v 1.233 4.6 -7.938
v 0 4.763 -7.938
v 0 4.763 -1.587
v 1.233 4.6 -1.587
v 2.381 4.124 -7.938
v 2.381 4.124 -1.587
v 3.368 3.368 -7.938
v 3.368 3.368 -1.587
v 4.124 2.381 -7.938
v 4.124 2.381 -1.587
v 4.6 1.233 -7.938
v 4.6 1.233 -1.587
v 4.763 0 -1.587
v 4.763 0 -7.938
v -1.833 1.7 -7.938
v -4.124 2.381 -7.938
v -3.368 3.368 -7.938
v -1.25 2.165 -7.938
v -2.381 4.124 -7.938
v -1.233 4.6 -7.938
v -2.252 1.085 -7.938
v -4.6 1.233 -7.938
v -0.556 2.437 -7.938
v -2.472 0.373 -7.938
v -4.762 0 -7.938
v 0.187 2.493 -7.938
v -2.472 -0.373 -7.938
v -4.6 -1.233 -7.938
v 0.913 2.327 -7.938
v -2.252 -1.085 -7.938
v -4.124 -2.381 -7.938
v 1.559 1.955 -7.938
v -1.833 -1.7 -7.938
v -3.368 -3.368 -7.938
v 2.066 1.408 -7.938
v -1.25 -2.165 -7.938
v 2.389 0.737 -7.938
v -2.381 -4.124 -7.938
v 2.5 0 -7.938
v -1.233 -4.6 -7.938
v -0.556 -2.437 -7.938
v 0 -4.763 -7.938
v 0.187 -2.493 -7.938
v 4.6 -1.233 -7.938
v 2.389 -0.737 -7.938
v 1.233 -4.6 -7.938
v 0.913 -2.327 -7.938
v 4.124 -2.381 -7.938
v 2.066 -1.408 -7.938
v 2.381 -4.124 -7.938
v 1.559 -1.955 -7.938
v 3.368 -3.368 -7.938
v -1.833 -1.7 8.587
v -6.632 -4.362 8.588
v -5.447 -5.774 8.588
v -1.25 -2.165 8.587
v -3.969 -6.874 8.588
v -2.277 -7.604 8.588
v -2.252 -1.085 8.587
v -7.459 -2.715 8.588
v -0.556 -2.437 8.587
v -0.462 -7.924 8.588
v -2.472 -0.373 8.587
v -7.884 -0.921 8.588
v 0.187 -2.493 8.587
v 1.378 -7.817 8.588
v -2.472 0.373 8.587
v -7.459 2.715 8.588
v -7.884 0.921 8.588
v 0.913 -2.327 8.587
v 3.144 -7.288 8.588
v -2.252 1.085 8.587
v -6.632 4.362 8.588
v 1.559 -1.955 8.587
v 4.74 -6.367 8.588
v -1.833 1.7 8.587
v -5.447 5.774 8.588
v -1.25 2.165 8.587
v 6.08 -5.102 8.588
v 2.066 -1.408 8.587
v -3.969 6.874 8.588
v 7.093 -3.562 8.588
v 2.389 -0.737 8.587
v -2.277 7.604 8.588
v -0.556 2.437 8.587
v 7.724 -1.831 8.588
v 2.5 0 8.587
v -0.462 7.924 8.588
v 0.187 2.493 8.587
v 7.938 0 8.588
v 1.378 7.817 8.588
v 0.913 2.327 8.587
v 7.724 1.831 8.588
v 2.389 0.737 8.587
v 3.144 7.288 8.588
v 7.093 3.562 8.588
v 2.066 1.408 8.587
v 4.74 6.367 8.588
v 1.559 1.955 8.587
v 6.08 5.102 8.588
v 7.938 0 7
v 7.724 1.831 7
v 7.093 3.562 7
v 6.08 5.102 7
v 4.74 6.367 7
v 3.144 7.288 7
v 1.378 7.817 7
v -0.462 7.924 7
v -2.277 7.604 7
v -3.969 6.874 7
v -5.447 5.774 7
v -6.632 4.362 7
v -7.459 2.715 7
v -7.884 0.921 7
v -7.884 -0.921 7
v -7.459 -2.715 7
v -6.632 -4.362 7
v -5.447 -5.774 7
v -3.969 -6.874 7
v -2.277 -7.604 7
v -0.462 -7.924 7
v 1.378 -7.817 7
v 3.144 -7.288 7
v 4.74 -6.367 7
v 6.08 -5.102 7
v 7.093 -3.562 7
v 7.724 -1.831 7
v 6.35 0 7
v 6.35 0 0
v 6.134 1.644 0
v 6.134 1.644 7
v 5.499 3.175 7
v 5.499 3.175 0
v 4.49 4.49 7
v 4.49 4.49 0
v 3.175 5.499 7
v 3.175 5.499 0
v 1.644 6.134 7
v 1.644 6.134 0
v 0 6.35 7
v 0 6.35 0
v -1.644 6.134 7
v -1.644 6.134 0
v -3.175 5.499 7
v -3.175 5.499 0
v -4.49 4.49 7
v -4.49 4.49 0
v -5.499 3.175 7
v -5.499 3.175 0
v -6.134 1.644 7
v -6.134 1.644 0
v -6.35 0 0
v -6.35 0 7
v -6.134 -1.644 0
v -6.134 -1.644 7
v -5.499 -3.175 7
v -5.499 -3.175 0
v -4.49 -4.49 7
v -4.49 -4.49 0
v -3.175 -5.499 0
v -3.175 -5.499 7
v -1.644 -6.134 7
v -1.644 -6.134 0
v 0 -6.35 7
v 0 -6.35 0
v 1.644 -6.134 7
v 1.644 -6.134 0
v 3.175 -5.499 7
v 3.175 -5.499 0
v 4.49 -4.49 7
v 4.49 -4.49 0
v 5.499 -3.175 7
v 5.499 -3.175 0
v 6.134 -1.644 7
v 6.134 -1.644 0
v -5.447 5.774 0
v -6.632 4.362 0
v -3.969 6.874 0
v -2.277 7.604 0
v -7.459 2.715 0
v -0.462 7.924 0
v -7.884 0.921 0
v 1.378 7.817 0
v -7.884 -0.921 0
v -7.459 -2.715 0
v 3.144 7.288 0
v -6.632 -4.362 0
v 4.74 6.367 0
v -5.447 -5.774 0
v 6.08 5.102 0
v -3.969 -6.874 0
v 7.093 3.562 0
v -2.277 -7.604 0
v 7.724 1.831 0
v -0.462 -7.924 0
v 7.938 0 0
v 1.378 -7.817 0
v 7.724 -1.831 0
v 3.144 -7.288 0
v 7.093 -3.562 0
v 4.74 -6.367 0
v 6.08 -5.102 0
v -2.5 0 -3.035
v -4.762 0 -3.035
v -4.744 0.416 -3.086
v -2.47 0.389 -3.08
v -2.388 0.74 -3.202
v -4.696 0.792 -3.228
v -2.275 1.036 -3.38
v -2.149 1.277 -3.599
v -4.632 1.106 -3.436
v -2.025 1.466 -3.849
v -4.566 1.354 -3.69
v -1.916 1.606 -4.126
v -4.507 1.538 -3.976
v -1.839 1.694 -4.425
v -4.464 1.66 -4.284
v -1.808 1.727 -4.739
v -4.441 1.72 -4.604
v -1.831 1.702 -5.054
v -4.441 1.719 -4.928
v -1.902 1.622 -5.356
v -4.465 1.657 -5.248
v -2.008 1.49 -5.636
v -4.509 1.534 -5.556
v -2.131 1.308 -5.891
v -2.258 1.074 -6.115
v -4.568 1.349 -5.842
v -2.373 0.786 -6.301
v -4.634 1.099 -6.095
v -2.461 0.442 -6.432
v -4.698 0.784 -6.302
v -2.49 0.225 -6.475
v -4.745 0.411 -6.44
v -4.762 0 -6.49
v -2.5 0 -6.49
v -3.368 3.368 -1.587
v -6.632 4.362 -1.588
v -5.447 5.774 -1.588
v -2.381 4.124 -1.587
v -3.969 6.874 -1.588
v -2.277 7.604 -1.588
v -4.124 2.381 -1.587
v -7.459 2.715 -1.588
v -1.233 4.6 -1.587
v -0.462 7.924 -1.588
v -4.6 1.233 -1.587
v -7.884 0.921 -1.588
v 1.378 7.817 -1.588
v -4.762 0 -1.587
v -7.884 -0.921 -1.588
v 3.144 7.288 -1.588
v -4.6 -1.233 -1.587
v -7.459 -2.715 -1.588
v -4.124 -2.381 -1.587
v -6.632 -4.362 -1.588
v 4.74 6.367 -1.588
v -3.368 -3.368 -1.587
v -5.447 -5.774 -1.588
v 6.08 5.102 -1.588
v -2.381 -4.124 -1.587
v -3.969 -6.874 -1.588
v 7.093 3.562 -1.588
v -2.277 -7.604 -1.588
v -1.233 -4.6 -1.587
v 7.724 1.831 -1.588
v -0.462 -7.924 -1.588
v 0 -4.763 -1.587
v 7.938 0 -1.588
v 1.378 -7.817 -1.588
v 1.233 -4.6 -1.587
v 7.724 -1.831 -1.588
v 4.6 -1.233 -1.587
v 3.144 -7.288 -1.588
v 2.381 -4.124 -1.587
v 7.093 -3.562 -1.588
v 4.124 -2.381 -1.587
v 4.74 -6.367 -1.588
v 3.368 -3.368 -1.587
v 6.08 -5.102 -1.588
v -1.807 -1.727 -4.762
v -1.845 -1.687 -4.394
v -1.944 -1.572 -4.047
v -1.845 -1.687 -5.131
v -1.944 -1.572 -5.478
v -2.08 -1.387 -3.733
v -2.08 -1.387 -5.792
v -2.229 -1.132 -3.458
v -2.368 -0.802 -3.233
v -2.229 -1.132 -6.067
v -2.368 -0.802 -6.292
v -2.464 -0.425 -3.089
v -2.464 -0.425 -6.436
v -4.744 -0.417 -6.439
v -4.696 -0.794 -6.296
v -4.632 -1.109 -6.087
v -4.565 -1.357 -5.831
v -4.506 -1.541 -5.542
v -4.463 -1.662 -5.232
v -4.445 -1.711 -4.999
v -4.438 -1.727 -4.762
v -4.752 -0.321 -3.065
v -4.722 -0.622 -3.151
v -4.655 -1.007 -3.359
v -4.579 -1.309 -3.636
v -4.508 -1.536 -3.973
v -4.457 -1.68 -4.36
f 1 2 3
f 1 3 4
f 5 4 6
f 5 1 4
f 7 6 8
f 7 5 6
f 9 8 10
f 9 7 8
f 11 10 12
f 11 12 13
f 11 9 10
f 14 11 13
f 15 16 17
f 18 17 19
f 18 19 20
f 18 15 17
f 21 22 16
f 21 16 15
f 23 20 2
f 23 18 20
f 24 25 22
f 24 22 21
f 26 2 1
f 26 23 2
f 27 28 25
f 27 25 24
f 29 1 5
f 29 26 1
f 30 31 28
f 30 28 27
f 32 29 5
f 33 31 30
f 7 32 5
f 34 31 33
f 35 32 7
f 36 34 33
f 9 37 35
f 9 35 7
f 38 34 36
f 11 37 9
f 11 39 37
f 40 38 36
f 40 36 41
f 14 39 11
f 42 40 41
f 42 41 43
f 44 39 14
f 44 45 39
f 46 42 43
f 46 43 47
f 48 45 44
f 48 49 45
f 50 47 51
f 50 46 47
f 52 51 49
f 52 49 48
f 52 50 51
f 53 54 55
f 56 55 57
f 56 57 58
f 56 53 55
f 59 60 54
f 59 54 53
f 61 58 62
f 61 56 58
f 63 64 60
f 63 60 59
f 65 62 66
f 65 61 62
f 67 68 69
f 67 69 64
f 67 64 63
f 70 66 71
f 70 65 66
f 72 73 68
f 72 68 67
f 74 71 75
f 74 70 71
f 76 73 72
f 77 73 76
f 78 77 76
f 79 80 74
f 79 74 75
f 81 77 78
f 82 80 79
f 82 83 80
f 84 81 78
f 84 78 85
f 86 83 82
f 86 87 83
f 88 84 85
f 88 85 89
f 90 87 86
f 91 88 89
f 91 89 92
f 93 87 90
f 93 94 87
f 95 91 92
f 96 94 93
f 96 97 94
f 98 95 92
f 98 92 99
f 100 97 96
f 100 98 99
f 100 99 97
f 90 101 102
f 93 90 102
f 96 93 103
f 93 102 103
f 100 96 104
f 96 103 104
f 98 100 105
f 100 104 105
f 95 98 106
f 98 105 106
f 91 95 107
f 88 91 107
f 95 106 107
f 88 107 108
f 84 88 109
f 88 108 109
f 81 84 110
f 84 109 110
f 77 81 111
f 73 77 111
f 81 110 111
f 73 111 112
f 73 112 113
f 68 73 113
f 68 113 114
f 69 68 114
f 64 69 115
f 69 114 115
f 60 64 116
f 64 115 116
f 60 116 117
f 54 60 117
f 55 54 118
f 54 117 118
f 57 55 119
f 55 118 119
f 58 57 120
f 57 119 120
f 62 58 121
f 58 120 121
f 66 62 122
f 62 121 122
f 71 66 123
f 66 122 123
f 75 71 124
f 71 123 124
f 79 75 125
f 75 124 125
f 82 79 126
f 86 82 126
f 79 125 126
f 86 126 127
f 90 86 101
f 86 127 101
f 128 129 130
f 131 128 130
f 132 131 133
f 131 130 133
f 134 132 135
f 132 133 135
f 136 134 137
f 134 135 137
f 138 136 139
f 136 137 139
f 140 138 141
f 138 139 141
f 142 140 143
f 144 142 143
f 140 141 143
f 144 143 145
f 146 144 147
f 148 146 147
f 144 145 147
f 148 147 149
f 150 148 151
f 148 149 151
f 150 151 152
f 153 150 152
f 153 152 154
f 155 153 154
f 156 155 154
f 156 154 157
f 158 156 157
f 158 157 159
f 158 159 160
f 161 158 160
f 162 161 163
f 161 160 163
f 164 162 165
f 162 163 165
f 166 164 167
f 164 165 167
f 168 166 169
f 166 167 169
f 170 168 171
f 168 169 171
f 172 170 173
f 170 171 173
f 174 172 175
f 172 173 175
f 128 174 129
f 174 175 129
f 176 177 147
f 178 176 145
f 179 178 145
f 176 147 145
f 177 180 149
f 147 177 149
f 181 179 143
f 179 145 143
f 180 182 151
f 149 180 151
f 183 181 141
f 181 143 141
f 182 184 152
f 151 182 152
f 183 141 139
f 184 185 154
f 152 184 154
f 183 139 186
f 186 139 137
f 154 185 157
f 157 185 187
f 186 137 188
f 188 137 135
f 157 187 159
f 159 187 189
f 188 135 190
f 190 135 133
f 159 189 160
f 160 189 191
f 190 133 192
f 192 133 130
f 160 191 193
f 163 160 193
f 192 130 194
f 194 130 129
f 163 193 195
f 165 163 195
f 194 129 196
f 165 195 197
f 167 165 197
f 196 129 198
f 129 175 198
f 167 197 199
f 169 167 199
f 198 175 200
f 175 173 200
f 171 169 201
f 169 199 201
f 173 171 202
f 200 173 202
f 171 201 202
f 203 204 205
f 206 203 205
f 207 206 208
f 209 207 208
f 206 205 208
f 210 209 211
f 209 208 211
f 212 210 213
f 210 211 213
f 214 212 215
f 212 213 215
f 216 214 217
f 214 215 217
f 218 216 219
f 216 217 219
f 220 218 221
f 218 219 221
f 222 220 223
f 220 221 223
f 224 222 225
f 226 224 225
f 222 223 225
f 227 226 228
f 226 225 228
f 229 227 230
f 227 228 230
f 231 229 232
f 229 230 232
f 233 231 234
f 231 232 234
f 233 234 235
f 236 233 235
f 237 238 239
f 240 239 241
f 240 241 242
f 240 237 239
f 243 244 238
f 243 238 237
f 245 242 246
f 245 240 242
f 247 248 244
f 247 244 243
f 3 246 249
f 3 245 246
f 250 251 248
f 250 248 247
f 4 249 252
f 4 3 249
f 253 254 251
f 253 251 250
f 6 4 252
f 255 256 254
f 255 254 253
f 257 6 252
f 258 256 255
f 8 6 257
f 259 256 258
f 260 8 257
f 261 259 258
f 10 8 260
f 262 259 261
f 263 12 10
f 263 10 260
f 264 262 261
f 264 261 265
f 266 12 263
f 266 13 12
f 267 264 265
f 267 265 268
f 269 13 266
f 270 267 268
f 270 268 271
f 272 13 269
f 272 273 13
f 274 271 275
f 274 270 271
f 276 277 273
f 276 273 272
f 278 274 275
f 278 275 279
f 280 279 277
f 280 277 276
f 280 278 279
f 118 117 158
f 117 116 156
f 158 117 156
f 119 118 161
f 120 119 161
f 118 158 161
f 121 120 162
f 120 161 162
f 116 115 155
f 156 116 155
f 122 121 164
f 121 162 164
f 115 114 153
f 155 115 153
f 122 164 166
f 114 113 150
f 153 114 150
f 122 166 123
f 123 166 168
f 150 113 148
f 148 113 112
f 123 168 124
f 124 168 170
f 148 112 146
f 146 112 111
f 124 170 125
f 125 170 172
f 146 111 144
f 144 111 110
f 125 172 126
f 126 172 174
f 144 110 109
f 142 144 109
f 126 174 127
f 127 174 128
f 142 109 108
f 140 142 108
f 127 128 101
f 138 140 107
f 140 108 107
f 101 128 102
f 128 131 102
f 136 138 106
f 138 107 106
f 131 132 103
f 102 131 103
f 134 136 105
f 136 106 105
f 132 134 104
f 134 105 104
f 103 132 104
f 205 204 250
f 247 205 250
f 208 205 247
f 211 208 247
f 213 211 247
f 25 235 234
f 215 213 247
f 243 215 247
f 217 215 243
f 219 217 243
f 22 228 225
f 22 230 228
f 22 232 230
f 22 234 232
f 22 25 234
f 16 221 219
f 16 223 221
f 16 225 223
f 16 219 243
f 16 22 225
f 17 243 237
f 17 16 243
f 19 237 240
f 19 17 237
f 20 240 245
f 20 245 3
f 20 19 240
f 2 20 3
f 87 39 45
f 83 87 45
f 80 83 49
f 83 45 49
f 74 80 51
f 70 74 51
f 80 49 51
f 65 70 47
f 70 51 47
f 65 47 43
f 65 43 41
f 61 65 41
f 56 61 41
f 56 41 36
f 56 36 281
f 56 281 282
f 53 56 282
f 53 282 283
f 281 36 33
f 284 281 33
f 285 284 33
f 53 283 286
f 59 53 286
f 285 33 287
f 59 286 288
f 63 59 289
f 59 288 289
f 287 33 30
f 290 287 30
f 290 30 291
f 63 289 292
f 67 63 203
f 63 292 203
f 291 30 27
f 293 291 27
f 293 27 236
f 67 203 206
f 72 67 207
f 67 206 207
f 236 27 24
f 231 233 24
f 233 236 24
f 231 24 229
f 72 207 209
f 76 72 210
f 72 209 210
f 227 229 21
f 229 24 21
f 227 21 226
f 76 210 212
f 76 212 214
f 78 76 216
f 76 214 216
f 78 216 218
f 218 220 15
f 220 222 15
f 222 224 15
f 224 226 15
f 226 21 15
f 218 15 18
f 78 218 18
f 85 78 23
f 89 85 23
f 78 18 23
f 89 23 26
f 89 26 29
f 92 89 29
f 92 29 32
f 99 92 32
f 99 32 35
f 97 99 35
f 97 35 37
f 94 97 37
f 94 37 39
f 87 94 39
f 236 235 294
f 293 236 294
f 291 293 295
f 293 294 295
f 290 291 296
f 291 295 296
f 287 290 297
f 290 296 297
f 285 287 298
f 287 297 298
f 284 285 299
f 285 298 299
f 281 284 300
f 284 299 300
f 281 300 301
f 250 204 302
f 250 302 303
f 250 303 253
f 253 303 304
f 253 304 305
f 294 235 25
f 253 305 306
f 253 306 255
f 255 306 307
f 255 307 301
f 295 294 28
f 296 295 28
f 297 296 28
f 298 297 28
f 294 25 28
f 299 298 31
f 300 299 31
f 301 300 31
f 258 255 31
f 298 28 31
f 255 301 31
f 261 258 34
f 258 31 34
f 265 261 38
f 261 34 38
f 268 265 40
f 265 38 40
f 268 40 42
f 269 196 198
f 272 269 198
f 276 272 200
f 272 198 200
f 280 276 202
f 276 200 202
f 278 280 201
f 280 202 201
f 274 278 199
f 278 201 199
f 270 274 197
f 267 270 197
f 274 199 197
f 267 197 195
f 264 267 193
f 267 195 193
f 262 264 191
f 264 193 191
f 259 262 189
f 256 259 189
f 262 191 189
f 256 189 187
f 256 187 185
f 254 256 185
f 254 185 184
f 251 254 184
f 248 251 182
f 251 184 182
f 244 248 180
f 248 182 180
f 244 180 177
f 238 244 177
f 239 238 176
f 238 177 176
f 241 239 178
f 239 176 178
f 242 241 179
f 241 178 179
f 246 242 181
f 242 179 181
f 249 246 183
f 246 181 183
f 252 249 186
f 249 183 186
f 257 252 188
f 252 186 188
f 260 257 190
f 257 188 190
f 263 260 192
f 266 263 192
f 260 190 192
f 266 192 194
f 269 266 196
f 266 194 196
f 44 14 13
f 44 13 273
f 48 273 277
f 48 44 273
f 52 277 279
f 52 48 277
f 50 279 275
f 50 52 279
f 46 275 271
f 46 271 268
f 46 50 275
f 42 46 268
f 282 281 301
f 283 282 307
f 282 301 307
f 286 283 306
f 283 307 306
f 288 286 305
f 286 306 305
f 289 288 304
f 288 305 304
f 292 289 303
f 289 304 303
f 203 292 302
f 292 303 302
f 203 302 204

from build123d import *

# Parameters (mm, degrees)
F0_R         = 6.35
F1_DEPTH     = 7
F2_R         = 7.9375
F3_DEPTH     = 1.5875
F4_R         = 7.9375
F5_DEPTH     = 1.5875
F6_W         = 9.525
F6_H         = 9.525
F7_DEPTH     = 6.35
F8_R         = 2.5
F9_DEPTH     = 16.525
F11_REACH    = 16.5631366107
F12_T1_DEPTH = 18.25625


# Not quite as in the source:
# - a fillet or chamfer that OpenCascade refuses, or shapes differently, is made with other operations: its cross-section is extruded or revolved along the edge and cut away or added


with BuildPart() as f1:
    # F0 (on Top) → F1 (new body)
    with BuildSketch(Plane.XY):
        Circle(F0_R)
    extrude(amount=F1_DEPTH)

    # F2 (on face) → F3 (join)
    with BuildSketch(Plane.XY.offset(7)):
        Circle(F2_R)
    extrude(amount=F3_DEPTH)

    # F4 (on face) → F5 (join)
    with BuildSketch(Plane(origin=(0, 0, 0), x_dir=(1, 0, 0), z_dir=(0, 0, -1))):
        Circle(F4_R)
    extrude(amount=F5_DEPTH)

    # F6 (on face) → F7 (join)
    with BuildSketch(Plane(origin=(0, 0, -1.5875), x_dir=(1, 0, 0), z_dir=(0, 0, -1))):
        Rectangle(F6_W, F6_H)
    extrude(amount=F7_DEPTH)

    # F8 (on face) → F9 (cut, through all)
    with BuildSketch(Plane(origin=(0, 0, -7.9375), x_dir=(1, 0, 0), z_dir=(0, 0, -1))):
        Circle(F8_R)
    extrude(amount=-F9_DEPTH, mode=Mode.SUBTRACT)

    f11_end = f1.faces().sort_by_distance((-2.5, 0, 0.325))[0]
    # F10 (on face) → F11 (cut, up to a face of the model that its end follows)
    with BuildSketch(Plane(origin=(-4.7625, 0, 0), x_dir=(0, -1, 0), z_dir=(-1, 0, 0))):
        with BuildLine():
            ThreePointArc((0, -3.0353), (-1.7272, -4.7625), (0, -6.4897))
            Line((0, -6.4897), (0, -3.0353))
        make_face()
        with BuildLine():
            Line((0, -3.0353), (0, -6.4897))
            ThreePointArc((0, -6.4897), (1.2213148325, -5.9838148325), (1.7272, -4.7625))
            ThreePointArc((1.7272, -4.7625), (1.2213148325, -3.5411851675), (0, -3.0353))
        make_face()
    f11_long = extrude(amount=-F11_REACH, mode=Mode.PRIVATE)
    add(split(f11_long, bisect_by=f11_end, keep=Keep.ALL, mode=Mode.PRIVATE).solids().sort_by_distance((-4.7625, 0, -4.7625))[0], mode=Mode.SUBTRACT)

    # F12: fillet of radius 4.7625 on 4 edges, made by hand

    # F12_s2 → F12_t1 (cut)
    with BuildSketch(Plane.XY.offset(-19.84375)):
        with BuildLine():
            ThreePointArc((-4.7625, 0), (-3.3675960454, -3.3675960454), (0, -4.7625))
            Line((0, -4.7625), (-4.7625, -4.7625))
            Line((-4.7625, -4.7625), (-4.7625, 0))
        make_face()
        with BuildLine():
            ThreePointArc((-4.7625, 0), (-3.3675960454, 3.3675960454), (0, 4.7625))
            Line((0, 4.7625), (-4.7625, 4.7625))
            Line((-4.7625, 4.7625), (-4.7625, 0))
        make_face()
        with BuildLine():
            ThreePointArc((0, 4.7625), (3.3675960454, 3.3675960454), (4.7625, 0))
            Line((4.7625, 0), (4.7625, 4.7625))
            Line((4.7625, 4.7625), (0, 4.7625))
        make_face()
        with BuildLine():
            ThreePointArc((4.7625, 0), (3.3675960454, -3.3675960454), (0, -4.7625))
            Line((0, -4.7625), (4.7625, -4.7625))
            Line((4.7625, -4.7625), (4.7625, 0))
        make_face()
    extrude(amount=F12_T1_DEPTH, mode=Mode.SUBTRACT)


solid = f1.part
